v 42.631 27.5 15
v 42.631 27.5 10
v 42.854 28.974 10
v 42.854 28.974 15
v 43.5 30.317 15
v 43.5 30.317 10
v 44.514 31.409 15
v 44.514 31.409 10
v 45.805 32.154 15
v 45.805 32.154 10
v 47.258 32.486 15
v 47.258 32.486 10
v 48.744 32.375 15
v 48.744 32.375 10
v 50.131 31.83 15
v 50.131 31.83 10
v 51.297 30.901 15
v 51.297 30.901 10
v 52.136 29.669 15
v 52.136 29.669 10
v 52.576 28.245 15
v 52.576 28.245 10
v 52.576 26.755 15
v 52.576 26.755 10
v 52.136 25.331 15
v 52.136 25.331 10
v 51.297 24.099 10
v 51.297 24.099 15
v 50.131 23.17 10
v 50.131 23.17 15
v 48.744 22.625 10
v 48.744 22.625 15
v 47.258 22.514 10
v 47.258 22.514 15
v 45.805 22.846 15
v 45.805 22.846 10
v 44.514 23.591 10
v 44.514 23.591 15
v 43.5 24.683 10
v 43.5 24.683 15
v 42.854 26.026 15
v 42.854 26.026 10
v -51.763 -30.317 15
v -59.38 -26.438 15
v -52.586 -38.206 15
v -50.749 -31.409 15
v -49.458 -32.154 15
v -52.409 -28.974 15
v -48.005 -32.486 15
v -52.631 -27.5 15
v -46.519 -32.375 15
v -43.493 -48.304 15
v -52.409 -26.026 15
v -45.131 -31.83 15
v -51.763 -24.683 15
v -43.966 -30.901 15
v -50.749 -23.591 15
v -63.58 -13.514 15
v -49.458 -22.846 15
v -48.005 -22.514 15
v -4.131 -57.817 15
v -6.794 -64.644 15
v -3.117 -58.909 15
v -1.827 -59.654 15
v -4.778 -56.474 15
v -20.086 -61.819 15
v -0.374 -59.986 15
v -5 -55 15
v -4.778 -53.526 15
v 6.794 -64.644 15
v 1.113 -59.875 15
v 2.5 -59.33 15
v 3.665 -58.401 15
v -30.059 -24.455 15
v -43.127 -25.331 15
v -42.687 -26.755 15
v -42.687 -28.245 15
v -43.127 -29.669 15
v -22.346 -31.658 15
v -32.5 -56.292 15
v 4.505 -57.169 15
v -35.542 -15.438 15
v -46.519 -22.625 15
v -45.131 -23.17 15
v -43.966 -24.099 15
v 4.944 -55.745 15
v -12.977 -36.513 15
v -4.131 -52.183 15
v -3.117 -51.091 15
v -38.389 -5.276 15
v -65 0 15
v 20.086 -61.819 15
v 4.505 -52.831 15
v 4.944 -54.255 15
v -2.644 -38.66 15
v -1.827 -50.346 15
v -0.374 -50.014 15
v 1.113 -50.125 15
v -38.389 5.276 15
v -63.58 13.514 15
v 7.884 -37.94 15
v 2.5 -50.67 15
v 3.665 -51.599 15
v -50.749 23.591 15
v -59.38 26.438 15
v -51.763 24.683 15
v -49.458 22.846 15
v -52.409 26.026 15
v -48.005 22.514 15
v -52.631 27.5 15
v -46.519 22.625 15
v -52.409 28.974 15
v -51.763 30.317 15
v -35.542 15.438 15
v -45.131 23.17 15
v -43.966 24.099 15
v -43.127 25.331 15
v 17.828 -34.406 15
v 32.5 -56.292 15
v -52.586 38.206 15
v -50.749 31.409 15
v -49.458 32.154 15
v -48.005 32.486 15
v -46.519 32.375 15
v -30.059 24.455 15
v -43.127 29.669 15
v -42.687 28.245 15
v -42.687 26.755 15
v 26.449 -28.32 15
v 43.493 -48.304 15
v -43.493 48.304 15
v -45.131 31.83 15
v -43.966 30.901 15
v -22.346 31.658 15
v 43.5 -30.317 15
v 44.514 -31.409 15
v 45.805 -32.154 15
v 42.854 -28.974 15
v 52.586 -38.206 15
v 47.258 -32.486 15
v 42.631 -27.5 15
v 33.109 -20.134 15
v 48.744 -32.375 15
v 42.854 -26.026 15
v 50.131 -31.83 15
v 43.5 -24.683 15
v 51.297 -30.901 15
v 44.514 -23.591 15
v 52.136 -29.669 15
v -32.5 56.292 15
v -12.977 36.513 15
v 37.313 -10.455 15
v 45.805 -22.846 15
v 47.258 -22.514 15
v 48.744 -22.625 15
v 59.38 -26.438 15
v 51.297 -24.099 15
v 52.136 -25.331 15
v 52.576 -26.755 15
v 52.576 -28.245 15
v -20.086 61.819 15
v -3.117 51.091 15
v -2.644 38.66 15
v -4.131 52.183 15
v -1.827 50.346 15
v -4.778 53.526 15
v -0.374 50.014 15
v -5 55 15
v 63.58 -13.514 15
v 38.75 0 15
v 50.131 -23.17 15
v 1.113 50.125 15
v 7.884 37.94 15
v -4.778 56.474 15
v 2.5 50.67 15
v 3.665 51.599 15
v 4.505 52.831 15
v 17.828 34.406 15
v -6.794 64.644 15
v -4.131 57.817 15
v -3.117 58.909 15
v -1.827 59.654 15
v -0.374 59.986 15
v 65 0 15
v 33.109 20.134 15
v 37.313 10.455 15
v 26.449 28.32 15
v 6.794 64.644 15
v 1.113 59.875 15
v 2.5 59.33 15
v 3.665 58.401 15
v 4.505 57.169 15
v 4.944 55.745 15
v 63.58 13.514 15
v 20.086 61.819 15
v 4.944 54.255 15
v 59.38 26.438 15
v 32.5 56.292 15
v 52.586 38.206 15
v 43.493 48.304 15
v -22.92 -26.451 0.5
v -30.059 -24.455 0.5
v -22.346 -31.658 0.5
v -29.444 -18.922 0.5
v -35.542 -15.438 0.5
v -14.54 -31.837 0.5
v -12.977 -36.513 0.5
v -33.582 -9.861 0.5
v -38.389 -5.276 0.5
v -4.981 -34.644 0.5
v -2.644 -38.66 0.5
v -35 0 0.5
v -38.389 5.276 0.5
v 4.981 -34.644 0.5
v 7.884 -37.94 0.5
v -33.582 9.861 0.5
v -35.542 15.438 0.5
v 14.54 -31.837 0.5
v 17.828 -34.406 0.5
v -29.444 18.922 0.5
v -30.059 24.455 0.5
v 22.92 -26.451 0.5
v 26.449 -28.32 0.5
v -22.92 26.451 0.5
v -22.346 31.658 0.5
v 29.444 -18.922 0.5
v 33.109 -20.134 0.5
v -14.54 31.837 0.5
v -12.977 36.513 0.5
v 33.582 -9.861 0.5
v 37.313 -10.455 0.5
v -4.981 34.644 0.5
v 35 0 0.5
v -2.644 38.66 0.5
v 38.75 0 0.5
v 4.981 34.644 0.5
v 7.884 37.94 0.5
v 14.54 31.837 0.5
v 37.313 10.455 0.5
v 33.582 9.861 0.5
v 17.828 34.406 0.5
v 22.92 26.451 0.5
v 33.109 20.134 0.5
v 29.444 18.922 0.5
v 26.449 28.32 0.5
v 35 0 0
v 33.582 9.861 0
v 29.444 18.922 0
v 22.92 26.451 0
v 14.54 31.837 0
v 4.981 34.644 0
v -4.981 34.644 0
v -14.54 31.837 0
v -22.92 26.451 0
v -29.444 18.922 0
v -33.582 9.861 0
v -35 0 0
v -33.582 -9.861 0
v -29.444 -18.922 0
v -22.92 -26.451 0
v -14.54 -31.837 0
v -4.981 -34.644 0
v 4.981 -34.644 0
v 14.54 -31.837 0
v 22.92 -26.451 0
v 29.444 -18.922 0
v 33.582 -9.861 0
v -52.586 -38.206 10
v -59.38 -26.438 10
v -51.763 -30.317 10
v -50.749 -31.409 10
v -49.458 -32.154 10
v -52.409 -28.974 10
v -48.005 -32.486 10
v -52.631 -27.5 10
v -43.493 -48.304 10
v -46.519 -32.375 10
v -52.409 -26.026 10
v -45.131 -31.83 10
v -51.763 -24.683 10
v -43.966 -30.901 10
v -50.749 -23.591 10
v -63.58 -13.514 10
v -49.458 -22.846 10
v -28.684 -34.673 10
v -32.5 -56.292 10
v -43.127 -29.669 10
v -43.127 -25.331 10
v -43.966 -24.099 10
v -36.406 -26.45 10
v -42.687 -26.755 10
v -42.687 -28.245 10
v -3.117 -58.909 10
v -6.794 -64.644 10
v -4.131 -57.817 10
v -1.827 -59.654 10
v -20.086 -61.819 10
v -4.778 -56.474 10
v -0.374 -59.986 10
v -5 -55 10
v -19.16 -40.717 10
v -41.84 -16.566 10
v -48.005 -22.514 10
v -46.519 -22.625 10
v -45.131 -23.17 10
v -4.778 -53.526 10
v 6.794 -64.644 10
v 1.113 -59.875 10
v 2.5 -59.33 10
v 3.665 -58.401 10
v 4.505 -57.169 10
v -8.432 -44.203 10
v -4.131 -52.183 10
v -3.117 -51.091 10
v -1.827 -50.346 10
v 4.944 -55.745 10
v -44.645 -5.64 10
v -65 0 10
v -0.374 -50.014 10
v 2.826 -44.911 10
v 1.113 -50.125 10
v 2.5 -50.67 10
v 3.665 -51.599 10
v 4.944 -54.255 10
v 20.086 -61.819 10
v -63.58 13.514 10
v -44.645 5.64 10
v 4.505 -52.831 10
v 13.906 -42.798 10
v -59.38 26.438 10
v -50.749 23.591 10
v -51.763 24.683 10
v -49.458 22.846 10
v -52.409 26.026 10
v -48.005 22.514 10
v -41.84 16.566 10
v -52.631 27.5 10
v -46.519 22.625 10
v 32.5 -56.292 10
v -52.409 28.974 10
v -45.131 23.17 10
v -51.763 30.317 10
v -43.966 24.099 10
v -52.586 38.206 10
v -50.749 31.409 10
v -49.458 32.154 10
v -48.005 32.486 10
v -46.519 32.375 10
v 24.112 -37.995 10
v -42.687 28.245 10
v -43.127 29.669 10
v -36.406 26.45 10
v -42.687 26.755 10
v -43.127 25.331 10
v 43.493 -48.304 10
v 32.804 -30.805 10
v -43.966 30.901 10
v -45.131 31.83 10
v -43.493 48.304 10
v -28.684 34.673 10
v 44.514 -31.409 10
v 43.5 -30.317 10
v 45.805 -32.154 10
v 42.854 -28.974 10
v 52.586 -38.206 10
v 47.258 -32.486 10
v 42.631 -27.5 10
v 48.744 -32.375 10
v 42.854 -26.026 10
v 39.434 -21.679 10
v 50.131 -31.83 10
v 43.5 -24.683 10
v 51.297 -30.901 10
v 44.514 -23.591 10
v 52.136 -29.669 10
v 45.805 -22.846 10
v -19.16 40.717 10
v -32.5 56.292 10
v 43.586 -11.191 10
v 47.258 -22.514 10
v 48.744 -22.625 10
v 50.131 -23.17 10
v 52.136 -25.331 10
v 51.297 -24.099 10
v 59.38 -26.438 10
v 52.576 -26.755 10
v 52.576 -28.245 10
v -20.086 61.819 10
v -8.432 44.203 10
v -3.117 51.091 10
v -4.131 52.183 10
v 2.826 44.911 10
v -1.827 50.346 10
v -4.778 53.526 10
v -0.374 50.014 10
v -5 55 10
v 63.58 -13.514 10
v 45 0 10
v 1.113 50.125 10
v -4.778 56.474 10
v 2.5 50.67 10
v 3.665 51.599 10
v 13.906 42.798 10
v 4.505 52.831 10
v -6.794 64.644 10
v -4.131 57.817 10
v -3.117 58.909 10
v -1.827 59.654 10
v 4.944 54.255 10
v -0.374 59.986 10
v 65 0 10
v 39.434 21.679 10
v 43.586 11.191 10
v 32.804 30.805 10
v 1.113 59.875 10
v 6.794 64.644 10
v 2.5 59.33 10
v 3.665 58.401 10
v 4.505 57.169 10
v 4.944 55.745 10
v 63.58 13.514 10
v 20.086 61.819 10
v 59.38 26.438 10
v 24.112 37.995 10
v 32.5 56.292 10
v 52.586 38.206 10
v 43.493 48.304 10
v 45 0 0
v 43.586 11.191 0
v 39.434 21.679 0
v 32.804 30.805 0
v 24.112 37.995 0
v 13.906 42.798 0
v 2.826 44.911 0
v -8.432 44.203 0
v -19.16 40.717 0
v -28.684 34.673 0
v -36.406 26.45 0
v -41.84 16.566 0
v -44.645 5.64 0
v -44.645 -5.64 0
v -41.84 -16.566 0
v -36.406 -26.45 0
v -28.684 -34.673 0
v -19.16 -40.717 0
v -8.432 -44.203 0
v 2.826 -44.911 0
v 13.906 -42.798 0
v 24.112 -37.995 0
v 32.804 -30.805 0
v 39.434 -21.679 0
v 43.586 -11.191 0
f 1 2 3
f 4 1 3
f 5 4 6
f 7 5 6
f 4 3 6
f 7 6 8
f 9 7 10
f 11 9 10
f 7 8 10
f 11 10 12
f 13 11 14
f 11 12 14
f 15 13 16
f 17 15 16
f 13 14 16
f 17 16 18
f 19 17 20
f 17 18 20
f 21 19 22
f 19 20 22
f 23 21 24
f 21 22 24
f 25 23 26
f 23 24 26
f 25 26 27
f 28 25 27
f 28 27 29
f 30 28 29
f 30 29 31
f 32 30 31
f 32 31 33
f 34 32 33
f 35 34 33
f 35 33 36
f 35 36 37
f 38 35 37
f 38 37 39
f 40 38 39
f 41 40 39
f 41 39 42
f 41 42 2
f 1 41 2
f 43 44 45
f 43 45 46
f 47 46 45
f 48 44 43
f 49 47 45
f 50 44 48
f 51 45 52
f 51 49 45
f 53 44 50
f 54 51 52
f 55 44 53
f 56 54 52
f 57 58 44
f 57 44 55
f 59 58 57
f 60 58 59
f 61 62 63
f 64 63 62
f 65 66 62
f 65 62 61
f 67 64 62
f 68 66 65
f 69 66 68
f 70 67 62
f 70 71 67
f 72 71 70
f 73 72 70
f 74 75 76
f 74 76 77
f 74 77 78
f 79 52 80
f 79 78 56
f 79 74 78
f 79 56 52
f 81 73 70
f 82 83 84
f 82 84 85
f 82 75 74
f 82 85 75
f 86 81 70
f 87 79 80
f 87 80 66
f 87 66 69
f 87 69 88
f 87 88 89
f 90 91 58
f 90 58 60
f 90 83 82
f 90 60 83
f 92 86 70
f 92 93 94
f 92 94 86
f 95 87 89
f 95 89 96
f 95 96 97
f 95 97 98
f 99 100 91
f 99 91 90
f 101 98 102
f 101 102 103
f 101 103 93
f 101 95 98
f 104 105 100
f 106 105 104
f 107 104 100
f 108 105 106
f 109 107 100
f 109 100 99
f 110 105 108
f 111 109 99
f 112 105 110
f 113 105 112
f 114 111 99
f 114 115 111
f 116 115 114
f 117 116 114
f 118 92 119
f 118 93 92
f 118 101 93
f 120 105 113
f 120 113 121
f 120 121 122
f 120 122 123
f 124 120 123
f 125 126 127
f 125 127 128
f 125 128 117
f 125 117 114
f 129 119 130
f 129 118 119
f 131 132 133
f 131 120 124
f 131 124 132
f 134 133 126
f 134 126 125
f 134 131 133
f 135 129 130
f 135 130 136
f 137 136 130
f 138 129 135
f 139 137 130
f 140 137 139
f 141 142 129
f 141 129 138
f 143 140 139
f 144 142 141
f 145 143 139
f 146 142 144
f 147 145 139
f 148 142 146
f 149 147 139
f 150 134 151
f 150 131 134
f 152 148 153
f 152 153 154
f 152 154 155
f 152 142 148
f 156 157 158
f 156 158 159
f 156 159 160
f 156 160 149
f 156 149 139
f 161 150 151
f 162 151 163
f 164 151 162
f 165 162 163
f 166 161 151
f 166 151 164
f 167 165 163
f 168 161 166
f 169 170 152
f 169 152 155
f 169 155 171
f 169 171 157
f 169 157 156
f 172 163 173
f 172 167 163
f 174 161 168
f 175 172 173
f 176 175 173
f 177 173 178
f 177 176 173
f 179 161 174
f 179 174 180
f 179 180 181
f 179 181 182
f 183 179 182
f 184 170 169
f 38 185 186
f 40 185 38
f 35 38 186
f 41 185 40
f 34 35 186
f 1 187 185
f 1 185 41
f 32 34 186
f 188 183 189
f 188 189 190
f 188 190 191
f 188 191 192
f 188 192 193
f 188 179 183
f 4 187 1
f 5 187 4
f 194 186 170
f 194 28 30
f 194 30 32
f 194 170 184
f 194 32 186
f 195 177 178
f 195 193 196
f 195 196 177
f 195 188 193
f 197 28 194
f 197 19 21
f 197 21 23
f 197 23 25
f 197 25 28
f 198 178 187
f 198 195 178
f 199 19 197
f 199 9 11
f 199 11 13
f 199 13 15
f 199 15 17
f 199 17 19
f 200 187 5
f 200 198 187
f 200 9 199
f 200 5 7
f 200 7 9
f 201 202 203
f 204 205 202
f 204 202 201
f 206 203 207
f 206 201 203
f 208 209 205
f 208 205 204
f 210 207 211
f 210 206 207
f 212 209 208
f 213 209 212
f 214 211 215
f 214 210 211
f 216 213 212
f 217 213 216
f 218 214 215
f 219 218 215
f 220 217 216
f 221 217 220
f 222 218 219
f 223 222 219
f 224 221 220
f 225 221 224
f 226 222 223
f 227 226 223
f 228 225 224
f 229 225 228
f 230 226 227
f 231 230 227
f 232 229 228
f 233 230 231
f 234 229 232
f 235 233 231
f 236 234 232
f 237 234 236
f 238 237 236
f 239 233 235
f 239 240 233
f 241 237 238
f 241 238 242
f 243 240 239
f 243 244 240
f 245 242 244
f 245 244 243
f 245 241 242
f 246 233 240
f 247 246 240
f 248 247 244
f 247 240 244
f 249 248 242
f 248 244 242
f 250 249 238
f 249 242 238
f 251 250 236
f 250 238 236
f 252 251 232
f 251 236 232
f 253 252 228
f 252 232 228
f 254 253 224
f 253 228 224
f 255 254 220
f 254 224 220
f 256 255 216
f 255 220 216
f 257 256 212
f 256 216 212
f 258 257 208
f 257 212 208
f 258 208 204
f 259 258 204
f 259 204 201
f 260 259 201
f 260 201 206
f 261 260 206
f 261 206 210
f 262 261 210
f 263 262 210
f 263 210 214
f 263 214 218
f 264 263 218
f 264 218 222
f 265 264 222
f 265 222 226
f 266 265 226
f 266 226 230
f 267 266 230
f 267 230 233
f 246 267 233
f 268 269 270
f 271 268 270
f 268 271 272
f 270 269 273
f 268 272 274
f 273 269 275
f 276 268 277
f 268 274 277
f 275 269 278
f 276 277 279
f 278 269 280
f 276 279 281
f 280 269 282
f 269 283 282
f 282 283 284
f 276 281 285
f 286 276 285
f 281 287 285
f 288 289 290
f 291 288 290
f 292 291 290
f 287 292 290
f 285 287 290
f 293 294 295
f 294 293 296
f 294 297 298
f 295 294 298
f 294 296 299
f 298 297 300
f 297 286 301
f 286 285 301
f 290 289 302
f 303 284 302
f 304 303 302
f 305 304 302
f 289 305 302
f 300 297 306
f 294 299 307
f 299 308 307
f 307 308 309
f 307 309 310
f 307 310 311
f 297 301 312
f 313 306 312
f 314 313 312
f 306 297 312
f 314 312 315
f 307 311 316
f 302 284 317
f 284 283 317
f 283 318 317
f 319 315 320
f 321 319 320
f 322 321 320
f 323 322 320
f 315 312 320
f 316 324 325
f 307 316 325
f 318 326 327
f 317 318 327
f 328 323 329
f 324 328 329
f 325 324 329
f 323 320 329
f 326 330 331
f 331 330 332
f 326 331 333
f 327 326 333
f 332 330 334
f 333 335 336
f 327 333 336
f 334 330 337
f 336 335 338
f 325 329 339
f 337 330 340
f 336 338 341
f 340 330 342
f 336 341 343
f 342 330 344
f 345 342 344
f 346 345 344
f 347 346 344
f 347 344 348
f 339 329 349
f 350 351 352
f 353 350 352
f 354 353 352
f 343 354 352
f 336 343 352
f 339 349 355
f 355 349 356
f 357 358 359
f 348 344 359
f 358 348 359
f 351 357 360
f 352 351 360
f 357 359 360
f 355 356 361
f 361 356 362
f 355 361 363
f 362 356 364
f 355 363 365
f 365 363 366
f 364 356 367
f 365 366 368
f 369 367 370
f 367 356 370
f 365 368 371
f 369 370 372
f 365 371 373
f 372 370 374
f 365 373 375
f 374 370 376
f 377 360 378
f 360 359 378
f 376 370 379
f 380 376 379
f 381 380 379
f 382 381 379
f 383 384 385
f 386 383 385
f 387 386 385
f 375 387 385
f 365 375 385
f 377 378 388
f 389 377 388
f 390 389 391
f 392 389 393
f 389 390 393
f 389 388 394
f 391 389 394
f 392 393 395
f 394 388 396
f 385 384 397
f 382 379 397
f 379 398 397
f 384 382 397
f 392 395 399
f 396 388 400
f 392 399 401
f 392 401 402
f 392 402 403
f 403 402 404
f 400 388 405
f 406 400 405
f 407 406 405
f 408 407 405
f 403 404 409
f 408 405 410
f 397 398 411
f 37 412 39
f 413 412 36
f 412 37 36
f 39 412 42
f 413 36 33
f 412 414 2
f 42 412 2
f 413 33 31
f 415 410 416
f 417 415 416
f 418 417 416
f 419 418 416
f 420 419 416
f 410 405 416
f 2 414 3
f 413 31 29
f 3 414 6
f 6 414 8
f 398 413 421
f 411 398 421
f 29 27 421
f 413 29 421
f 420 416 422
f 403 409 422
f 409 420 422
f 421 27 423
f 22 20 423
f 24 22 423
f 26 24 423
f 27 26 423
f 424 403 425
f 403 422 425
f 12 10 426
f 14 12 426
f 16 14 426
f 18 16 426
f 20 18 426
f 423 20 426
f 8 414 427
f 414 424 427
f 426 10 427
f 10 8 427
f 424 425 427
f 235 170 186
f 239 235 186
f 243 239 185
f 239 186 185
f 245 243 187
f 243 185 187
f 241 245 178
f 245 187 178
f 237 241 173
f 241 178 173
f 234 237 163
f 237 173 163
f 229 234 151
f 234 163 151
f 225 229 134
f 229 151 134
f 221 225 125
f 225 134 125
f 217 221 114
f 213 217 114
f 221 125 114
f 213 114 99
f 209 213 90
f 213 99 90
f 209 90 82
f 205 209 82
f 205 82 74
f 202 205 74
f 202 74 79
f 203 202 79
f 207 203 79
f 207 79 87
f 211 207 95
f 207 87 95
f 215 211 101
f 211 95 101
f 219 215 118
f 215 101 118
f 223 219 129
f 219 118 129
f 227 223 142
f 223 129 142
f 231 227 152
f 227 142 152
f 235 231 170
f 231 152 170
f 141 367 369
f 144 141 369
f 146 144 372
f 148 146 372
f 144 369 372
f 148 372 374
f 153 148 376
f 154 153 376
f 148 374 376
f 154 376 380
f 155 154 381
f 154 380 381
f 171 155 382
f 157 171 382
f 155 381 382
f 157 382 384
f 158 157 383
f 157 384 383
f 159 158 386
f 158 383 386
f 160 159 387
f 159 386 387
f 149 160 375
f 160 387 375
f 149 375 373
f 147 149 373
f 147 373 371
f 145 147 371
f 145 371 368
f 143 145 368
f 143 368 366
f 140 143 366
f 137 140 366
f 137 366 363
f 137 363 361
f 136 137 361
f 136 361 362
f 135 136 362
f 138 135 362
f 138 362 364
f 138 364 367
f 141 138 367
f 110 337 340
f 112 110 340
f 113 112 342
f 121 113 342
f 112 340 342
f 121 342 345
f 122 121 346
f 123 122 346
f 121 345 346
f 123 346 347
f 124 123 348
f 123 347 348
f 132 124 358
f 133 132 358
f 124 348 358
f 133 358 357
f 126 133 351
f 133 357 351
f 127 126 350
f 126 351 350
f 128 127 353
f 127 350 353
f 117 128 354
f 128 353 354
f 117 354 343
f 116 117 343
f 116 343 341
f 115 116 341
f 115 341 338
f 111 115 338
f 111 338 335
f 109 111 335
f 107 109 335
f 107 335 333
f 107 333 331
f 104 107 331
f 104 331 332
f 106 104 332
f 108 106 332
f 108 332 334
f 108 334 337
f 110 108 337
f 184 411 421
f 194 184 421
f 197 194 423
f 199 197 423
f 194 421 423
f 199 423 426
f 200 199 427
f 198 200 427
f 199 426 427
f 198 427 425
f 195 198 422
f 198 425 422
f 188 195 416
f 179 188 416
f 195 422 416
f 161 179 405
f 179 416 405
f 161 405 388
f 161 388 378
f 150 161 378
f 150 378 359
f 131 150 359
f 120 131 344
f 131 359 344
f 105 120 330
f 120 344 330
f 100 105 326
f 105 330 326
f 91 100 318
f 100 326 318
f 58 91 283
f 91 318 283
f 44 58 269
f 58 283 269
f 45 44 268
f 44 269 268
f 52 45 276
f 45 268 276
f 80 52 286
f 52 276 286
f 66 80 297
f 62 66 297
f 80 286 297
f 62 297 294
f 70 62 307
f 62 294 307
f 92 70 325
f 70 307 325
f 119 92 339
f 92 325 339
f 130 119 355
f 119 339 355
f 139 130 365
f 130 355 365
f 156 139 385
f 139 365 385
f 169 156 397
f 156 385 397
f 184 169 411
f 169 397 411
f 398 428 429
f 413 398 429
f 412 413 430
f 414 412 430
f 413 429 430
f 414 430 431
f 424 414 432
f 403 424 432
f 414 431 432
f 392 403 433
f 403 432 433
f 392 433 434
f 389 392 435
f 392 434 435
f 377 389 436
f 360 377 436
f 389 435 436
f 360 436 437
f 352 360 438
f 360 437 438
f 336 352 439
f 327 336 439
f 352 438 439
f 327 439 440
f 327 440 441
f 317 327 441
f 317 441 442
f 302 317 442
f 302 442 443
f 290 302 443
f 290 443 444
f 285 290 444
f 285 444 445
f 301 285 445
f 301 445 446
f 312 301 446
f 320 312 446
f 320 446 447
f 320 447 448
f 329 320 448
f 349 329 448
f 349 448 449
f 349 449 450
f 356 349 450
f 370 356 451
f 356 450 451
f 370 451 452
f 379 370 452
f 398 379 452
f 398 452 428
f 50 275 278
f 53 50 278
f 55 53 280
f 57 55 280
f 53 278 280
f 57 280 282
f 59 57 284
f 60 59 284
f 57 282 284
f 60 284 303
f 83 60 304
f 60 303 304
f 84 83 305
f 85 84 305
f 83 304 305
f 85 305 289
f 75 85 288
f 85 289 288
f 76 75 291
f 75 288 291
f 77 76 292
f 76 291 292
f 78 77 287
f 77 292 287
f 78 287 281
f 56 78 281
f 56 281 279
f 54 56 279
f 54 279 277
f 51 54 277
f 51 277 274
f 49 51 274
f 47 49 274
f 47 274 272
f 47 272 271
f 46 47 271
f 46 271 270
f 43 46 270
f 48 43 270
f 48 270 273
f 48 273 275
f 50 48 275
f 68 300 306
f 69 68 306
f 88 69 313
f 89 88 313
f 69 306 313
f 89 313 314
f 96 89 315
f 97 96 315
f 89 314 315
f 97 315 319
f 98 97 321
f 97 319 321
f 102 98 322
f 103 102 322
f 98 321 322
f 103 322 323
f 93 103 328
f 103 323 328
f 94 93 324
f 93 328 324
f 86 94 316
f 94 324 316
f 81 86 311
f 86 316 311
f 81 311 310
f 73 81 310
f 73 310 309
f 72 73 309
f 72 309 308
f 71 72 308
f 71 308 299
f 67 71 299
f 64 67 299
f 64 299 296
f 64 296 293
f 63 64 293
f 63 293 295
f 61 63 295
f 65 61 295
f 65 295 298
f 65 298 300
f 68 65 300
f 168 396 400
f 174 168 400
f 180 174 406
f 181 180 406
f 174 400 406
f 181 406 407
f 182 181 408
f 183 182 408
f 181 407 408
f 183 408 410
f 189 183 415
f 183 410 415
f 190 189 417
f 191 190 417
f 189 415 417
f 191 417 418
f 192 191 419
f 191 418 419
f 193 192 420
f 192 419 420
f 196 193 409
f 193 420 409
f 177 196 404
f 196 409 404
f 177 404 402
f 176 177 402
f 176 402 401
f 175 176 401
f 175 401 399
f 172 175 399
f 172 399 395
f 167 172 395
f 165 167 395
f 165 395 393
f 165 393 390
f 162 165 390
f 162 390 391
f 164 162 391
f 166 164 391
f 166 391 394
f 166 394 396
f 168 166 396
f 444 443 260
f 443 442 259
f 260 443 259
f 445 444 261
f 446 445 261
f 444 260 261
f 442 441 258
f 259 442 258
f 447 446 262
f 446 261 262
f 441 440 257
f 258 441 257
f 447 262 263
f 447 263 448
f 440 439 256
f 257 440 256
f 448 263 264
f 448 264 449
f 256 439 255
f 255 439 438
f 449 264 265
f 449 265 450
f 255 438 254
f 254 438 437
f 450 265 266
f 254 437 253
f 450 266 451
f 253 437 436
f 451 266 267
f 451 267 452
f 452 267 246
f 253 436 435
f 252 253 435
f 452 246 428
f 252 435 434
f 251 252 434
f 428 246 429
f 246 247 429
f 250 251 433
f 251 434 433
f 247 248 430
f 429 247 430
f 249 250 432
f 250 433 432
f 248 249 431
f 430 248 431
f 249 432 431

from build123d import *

# Parameters (mm, degrees)
SKETCH1_R           = 45
BOSS_EXTRUDE1_DEPTH = 15
SKETCH2_R           = 38.75
CUT_EXTRUDE1_DEPTH  = 14.5
SKETCH3_R           = 35
CUT_EXTRUDE2_DEPTH  = 66.270590621
BOSS_EXTRUDE2_START = -5
SKETCH4_R           = 65
SKETCH4_R_2         = 45
BOSS_EXTRUDE2_DEPTH = 5
SKETCH5_R           = 5
CUT_EXTRUDE3_DEPTH  = 93.466210045


with BuildPart() as part:
    # Sketch1 → Boss-Extrude1 (new body)
    with BuildSketch(Plane.XY):
        Circle(SKETCH1_R)
    extrude(amount=BOSS_EXTRUDE1_DEPTH)

    # Sketch2 → Cut-Extrude1 (cut)
    with BuildSketch(Plane.XY.offset(15)):
        Circle(SKETCH2_R)
    extrude(amount=-CUT_EXTRUDE1_DEPTH, mode=Mode.SUBTRACT)

    # Sketch3 → Cut-Extrude2 (cut, through all)
    with BuildSketch(Plane.XY.offset(0.5)):
        Circle(SKETCH3_R)
    extrude(amount=-CUT_EXTRUDE2_DEPTH, mode=Mode.SUBTRACT)

    # Sketch4 → Boss-Extrude2 (add)
    with BuildSketch(Plane.XY.offset(15).offset(BOSS_EXTRUDE2_START)):
        Circle(SKETCH4_R)
        Circle(SKETCH4_R_2, mode=Mode.SUBTRACT)
    extrude(amount=BOSS_EXTRUDE2_DEPTH)

    # Sketch5 → Cut-Extrude3 (cut, through all)
    with BuildSketch(Plane(origin=(0, 0, 10), x_dir=(-1, 0, 0), z_dir=(0, 0, -1))):
        with Locations((0, 55)):
            Circle(SKETCH5_R)
        with Locations((47.631397208, 27.5)):
            Circle(SKETCH5_R)
        with Locations((47.631397208, -27.5)):
            Circle(SKETCH5_R)
        with Locations((0, -55)):
            Circle(SKETCH5_R)
        with Locations((-47.631397208, -27.5)):
            Circle(SKETCH5_R)
        with Locations((-47.631397208, 27.5)):
            Circle(SKETCH5_R)
    extrude(amount=-CUT_EXTRUDE3_DEPTH, mode=Mode.SUBTRACT)


solid = part.part
